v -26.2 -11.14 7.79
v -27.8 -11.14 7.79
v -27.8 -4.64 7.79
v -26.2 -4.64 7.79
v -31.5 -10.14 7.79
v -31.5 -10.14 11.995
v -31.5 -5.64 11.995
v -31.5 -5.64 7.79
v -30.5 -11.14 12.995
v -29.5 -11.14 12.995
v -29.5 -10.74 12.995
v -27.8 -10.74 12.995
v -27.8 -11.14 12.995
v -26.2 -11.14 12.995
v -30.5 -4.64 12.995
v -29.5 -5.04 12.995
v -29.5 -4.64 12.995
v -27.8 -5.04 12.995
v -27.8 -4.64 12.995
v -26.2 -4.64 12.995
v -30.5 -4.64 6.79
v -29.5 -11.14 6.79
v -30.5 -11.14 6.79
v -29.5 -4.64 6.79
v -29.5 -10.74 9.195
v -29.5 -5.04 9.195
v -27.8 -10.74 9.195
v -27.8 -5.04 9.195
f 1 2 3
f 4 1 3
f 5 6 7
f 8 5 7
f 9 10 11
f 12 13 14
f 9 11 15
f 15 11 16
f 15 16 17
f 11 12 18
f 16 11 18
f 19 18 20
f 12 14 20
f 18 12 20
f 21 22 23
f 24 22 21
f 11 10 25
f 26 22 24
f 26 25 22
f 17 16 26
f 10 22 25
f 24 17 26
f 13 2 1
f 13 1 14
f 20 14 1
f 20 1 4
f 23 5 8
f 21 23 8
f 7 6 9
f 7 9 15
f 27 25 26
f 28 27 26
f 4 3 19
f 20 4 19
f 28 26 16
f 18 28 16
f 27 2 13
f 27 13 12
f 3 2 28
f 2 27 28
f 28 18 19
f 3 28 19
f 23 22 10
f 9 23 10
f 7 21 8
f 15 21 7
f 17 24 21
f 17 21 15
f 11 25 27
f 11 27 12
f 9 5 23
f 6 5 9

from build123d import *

# Parameters (mm, degrees)
SKETCH126_W  = 5.7
SKETCH126_H  = 3.8
PAD061_DEPTH = 1.7
SKETCH127_W  = 6.5
SKETCH127_H  = 5.205
PAD062_DEPTH = 1.6
SKETCH128_W  = 6.5
SKETCH128_H  = 6.205
PAD063_DEPTH = 2
CHAMFER_SIZE = 1


with BuildPart() as part:
    # Sketch126 → Pad061 (new body)
    with BuildSketch(Plane.YZ):
        with Locations((-7.89, 11.095)):
            Rectangle(SKETCH126_W, SKETCH126_H)
    extrude(amount=PAD061_DEPTH)

    # Sketch127 → Pad062 (join)
    with BuildSketch(Plane.YZ.offset(1.7)):
        with Locations((-7.89, 10.3925)):
            Rectangle(SKETCH127_W, SKETCH127_H)
    extrude(amount=PAD062_DEPTH)

    # Sketch128 → Pad063 (join)
    with BuildSketch(Plane.YZ):
        with Locations((-7.89, 9.8925)):
            Rectangle(SKETCH128_W, SKETCH128_H)
    extrude(amount=-PAD063_DEPTH)

    # Chamfer
    chamfer_edges = [part.edges().sort_by_distance(p)[0] for p in [
        (-2, -7.89, 12.995),
        (-2, -11.14, 9.8925),
        (-2, -7.89, 6.79),
        (-2, -4.64, 9.8925),
    ]]
    chamfer(chamfer_edges, length=CHAMFER_SIZE)


with BuildPart() as part_1:
    # Body017 placement: moved
    add(part.part.moved(Location((-29.5, 0, 0))))


solid = part_1.part
